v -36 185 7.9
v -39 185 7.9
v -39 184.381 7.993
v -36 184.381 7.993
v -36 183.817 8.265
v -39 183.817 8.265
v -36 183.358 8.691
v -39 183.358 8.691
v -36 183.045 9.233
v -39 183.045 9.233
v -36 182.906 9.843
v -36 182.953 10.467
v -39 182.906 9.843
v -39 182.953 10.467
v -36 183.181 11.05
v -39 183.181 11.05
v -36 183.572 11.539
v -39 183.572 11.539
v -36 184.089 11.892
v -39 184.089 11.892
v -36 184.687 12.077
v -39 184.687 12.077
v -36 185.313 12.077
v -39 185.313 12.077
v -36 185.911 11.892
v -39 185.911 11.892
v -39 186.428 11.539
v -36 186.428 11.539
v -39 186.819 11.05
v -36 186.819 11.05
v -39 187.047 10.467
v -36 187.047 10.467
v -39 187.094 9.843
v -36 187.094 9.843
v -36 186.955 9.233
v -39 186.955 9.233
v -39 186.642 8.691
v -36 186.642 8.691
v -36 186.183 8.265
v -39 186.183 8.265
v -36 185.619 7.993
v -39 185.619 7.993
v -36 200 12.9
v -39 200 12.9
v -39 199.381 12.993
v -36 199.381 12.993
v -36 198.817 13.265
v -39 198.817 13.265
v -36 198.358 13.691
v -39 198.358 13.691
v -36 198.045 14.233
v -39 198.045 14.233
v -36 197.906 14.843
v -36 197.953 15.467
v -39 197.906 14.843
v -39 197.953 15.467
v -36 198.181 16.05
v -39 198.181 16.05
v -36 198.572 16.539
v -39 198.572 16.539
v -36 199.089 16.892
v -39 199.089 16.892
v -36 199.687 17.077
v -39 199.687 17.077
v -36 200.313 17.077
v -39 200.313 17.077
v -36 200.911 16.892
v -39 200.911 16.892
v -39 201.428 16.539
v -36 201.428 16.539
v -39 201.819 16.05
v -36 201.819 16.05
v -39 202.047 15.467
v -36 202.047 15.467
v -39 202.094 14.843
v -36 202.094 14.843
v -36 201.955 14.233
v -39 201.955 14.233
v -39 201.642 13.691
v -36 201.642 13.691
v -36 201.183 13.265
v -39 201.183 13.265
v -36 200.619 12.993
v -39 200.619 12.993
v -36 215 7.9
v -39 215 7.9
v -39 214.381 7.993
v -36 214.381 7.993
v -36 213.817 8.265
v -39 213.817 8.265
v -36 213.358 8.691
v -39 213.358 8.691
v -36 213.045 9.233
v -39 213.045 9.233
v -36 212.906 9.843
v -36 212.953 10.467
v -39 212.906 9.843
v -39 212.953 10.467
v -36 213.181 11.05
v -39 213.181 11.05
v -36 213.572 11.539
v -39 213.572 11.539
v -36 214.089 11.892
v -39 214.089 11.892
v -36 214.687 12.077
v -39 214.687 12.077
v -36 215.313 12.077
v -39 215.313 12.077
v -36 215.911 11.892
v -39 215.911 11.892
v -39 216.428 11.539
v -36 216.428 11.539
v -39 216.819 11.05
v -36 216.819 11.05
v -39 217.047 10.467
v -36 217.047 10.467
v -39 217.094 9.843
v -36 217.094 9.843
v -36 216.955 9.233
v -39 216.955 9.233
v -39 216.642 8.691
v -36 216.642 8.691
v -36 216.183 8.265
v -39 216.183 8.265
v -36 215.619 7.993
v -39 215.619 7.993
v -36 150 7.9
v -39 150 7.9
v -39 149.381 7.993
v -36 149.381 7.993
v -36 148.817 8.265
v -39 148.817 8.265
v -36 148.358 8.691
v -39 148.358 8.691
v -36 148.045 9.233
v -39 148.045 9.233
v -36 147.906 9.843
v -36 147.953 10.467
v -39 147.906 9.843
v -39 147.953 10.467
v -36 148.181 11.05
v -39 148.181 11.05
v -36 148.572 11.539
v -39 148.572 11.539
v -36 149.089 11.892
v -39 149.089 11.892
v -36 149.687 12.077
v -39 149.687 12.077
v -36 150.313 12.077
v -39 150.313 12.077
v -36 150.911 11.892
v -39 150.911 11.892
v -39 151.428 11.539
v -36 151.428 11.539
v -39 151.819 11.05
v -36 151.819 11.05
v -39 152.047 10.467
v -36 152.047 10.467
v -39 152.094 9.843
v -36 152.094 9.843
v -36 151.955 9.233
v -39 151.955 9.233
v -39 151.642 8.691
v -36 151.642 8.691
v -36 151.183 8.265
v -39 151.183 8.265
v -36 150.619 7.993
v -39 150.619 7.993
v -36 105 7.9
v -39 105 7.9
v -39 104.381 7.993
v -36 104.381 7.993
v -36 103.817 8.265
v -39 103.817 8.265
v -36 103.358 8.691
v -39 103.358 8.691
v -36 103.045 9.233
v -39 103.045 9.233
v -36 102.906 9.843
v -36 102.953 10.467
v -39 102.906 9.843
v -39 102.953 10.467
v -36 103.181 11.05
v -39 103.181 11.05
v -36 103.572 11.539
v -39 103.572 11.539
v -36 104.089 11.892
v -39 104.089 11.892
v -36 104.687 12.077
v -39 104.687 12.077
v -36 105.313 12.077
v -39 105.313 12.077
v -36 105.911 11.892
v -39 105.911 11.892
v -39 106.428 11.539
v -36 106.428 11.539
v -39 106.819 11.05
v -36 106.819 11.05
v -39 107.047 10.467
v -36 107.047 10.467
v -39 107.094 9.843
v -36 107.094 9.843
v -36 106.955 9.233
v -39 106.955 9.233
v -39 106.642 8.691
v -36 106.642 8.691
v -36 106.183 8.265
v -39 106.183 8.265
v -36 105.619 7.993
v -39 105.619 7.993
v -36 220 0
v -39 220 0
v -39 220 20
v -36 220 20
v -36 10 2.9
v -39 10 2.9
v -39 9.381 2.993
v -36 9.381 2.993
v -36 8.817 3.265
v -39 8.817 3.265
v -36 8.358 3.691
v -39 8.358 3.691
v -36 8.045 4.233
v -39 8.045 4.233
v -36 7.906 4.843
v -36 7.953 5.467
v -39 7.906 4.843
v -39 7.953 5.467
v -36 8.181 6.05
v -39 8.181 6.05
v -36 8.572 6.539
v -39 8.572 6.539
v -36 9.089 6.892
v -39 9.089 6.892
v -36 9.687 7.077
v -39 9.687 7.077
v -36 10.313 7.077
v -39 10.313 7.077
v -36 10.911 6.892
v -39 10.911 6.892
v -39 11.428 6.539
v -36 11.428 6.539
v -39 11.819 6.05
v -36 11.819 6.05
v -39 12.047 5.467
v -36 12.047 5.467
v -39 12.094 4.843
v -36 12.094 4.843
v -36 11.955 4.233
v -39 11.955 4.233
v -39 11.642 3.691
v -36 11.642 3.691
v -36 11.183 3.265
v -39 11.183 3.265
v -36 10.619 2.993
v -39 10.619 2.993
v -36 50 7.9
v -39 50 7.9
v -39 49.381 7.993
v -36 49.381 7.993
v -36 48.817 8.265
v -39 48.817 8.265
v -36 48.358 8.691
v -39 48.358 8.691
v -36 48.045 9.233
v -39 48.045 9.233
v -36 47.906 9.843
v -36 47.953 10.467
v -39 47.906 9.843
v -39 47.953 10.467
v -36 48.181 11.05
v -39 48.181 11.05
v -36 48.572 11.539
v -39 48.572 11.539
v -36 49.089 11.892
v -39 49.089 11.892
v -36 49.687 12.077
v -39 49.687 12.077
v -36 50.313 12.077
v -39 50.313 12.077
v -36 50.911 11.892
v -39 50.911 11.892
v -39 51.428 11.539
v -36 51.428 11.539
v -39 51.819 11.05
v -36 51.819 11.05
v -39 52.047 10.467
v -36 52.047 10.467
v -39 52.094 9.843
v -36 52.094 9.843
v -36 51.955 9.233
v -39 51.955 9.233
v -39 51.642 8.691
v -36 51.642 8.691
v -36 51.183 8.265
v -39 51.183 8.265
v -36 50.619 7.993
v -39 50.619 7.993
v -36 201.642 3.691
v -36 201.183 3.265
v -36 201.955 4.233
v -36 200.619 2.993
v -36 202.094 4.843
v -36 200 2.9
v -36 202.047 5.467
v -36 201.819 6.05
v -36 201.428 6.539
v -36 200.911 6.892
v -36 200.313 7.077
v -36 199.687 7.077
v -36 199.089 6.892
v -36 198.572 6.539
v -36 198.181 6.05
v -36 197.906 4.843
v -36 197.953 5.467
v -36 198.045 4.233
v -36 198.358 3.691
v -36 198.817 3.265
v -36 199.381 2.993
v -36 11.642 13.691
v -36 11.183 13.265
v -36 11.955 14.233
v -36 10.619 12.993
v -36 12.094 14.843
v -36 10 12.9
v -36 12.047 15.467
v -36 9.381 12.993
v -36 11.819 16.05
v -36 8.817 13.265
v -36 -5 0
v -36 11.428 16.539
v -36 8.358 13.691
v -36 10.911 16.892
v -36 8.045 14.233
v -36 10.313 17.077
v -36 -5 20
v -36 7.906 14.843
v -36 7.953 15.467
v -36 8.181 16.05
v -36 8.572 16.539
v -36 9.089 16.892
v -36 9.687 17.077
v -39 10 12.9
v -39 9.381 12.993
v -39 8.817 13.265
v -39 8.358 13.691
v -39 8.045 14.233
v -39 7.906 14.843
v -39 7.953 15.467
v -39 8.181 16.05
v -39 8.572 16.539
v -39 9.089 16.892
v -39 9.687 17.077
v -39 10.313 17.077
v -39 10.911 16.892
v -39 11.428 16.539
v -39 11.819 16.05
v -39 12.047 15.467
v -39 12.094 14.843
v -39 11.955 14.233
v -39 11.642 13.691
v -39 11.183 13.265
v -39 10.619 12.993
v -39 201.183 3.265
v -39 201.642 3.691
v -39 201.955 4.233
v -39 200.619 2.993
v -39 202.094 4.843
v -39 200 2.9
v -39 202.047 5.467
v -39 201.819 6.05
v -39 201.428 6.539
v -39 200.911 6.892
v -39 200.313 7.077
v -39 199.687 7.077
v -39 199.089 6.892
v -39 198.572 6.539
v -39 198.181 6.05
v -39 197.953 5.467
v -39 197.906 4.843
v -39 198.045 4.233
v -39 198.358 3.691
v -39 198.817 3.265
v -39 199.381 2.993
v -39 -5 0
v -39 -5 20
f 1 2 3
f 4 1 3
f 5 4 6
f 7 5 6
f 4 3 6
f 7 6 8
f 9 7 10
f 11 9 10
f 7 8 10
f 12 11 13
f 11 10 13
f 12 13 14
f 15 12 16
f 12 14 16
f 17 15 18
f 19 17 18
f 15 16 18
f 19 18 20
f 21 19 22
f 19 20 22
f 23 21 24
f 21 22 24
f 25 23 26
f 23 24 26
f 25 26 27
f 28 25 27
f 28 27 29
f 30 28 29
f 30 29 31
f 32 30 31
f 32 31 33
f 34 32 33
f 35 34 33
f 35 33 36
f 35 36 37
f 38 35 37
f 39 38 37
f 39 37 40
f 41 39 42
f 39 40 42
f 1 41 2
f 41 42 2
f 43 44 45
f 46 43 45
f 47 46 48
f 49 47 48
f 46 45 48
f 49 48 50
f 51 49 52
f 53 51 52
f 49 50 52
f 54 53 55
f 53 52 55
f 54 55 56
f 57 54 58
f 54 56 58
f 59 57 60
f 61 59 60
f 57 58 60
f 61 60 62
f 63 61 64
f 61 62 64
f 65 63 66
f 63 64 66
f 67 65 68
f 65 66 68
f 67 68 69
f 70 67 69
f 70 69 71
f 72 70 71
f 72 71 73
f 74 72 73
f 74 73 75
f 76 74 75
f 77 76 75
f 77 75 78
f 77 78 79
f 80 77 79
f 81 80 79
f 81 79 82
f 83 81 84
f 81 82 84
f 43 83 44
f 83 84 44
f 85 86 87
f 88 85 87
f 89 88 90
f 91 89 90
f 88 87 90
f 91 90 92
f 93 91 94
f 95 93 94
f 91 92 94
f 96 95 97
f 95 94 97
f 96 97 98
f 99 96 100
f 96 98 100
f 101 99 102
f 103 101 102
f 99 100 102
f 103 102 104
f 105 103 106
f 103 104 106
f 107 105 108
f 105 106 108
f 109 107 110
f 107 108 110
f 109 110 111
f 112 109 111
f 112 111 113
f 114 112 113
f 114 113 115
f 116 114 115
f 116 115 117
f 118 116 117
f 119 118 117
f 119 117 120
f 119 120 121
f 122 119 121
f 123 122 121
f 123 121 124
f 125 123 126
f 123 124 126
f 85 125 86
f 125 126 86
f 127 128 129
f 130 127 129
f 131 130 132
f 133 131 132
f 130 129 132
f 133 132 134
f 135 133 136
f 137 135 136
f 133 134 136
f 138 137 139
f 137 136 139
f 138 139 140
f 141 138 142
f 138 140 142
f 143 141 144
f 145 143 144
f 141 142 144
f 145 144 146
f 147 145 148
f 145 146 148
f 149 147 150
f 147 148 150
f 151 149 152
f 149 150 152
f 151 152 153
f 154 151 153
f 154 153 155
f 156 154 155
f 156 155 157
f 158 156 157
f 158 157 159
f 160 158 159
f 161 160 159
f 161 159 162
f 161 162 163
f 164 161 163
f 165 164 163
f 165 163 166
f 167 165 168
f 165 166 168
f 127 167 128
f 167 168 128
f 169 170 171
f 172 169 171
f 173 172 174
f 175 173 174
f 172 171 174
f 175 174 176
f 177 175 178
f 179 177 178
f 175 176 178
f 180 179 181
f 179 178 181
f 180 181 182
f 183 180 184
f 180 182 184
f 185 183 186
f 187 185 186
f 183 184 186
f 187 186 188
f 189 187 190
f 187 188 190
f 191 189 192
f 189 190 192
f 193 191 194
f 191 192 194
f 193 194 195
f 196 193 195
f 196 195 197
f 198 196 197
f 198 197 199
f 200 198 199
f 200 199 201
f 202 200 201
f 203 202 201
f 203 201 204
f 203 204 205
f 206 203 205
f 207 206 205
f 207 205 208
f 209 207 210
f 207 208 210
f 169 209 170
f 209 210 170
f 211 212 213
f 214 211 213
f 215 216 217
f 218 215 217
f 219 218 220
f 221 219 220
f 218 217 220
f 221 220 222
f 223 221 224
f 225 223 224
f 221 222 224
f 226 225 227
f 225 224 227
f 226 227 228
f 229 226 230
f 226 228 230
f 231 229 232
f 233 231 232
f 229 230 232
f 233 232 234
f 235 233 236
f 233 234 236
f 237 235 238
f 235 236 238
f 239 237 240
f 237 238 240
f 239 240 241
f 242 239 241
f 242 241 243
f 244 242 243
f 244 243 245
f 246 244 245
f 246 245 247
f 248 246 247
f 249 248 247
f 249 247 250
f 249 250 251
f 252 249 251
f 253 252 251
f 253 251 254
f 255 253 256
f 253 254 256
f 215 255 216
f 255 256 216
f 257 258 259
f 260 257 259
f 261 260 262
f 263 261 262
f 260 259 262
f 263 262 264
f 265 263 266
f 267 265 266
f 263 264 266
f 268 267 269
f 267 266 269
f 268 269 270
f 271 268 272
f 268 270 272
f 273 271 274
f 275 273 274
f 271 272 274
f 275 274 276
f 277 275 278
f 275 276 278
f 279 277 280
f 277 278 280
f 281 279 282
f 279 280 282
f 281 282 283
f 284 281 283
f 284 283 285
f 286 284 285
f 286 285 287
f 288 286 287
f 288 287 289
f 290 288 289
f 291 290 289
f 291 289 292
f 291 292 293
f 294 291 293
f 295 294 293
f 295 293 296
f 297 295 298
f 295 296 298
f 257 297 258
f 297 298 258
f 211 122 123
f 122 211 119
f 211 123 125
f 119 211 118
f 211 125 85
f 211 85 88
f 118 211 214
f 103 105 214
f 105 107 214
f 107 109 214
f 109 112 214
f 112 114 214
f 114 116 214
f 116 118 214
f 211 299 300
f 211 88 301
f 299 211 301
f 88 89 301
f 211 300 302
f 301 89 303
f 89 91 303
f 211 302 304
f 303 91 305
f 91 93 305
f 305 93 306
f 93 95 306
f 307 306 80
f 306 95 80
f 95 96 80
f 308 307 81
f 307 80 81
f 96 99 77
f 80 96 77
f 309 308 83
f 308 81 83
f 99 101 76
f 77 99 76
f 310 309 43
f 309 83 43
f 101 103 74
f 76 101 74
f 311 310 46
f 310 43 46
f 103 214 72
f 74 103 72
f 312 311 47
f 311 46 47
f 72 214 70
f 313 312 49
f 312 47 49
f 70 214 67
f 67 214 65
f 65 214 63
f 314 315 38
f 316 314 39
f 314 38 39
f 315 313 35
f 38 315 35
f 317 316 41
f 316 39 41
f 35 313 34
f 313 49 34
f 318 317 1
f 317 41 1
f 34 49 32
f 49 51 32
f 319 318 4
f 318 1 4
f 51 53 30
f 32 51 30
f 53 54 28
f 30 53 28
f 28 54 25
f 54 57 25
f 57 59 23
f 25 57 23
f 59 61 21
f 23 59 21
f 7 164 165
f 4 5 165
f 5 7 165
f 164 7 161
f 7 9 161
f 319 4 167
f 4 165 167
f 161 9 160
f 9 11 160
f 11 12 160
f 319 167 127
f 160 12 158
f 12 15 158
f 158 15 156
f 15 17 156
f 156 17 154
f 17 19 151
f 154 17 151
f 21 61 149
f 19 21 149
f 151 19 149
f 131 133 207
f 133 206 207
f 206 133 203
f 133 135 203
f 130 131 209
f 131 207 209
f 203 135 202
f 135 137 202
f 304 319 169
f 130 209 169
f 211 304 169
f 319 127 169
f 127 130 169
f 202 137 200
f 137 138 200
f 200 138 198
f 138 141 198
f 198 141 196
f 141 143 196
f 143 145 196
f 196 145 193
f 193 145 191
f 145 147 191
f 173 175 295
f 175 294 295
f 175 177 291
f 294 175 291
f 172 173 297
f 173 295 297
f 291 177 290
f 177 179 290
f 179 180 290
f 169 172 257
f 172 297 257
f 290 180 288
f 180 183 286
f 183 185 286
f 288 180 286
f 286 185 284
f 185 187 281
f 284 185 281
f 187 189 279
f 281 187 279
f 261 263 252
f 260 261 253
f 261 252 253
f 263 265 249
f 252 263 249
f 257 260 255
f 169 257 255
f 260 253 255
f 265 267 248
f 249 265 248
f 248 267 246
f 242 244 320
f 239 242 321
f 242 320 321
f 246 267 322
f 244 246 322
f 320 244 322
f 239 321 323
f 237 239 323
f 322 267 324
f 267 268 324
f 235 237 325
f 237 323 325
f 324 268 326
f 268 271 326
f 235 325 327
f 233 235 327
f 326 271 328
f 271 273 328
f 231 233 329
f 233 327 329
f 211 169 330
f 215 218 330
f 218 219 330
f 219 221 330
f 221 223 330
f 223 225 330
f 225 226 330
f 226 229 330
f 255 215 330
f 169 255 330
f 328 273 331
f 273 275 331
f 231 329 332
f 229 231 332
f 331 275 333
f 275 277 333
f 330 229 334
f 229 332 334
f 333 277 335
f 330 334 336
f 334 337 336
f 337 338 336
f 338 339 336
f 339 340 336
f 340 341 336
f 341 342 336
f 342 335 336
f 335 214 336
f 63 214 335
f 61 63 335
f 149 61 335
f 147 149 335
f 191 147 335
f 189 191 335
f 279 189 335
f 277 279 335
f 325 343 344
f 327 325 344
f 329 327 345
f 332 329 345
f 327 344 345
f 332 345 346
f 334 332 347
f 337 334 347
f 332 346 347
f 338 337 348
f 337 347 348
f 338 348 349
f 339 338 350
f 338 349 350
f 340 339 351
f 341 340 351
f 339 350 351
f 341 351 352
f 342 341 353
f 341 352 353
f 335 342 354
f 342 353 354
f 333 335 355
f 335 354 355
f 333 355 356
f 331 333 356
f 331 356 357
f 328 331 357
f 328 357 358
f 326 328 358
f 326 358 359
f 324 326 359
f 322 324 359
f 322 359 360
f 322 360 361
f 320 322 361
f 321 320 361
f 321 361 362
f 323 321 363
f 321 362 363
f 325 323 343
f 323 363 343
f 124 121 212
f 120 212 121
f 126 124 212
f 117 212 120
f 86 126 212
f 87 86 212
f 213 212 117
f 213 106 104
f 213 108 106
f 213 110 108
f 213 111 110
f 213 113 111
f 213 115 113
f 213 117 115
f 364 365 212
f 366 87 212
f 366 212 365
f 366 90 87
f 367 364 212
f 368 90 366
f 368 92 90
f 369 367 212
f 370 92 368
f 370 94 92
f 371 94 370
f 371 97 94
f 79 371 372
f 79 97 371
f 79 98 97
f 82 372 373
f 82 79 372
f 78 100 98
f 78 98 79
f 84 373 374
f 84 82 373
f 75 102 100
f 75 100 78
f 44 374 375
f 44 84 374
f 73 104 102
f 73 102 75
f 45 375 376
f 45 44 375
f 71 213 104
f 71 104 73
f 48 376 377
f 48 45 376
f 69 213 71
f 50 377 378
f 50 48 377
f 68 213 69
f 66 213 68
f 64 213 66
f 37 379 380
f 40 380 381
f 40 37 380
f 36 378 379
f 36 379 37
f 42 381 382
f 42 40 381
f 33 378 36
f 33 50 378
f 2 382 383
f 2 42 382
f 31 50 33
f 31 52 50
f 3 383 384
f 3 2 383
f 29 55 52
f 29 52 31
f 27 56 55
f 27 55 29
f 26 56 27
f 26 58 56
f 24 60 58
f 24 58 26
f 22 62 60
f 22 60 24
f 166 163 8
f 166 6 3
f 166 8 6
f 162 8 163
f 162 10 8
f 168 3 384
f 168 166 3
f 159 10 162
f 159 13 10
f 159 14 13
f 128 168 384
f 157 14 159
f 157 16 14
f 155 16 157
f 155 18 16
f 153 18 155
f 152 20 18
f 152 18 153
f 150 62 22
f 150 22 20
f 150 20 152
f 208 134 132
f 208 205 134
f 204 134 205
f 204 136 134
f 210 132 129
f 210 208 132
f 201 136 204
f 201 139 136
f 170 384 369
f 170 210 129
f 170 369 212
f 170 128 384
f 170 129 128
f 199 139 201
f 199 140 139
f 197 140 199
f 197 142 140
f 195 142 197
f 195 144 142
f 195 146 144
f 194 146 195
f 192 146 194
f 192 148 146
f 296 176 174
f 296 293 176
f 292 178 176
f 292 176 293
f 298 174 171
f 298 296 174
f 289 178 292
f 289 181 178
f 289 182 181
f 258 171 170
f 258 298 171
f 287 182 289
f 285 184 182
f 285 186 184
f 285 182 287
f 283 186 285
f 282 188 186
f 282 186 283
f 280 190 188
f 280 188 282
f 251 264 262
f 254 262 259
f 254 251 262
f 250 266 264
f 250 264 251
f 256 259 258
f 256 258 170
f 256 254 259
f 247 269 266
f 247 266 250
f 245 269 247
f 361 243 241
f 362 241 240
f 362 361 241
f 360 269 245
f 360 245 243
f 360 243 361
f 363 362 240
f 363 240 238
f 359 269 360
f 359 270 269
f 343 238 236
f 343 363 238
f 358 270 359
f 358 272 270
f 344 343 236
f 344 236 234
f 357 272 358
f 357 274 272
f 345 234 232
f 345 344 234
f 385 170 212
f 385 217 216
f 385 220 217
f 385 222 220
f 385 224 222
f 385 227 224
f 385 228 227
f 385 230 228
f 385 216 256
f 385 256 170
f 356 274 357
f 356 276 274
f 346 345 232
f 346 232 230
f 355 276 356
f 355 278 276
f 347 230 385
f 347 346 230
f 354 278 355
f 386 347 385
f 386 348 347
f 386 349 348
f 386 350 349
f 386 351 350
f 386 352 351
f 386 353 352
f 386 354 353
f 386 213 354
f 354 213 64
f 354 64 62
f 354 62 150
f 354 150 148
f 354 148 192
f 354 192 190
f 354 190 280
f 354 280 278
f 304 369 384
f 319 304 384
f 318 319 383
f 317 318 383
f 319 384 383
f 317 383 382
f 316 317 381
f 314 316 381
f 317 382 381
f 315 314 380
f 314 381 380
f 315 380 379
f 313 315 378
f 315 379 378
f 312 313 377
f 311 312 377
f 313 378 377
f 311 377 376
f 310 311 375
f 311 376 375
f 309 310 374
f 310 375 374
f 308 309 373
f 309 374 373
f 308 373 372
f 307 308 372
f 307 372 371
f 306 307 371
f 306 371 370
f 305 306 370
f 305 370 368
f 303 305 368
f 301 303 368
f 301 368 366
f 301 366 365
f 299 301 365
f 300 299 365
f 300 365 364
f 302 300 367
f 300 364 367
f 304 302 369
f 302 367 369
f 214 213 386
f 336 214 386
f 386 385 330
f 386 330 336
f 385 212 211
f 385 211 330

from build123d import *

# Parameters (mm, degrees)
SKETCH_1_W      = 225
SKETCH_1_H      = 20
SKETCH_1_R      = 2.1
EXTRUDE_1_DEPTH = 3


with BuildPart() as part:
    # 草图1 → 凸台-拉伸1 (new body)
    with BuildSketch(Plane(origin=(-39, 0, 0), x_dir=(0, -1, 0), z_dir=(-1, 0, 0))):
        with Locations((-107.5, 10)):
            Rectangle(SKETCH_1_W, SKETCH_1_H)
        with Locations(Location((-215, 10, 0), (0, 0, 270))):
            Circle(SKETCH_1_R, mode=Mode.SUBTRACT)
        with Locations(Location((-200, 15, 0), (0, 0, 270))):
            Circle(SKETCH_1_R, mode=Mode.SUBTRACT)
        with Locations(Location((-185, 10, 0), (0, 0, 270))):
            Circle(SKETCH_1_R, mode=Mode.SUBTRACT)
        with Locations(Location((-10, 5, 0), (0, 0, 270))):
            Circle(SKETCH_1_R, mode=Mode.SUBTRACT)
        with Locations(Location((-10, 15, 0), (0, 0, 270))):
            Circle(SKETCH_1_R, mode=Mode.SUBTRACT)
        with Locations(Location((-200, 5, 0), (0, 0, 270))):
            Circle(SKETCH_1_R, mode=Mode.SUBTRACT)
        with Locations(Location((-150, 10, 0), (0, 0, 270))):
            Circle(SKETCH_1_R, mode=Mode.SUBTRACT)
        with Locations(Location((-105, 10, 0), (0, 0, 270))):
            Circle(SKETCH_1_R, mode=Mode.SUBTRACT)
        with Locations(Location((-50, 10, 0), (0, 0, 270))):
            Circle(SKETCH_1_R, mode=Mode.SUBTRACT)
    extrude(amount=-EXTRUDE_1_DEPTH)


solid = part.part
